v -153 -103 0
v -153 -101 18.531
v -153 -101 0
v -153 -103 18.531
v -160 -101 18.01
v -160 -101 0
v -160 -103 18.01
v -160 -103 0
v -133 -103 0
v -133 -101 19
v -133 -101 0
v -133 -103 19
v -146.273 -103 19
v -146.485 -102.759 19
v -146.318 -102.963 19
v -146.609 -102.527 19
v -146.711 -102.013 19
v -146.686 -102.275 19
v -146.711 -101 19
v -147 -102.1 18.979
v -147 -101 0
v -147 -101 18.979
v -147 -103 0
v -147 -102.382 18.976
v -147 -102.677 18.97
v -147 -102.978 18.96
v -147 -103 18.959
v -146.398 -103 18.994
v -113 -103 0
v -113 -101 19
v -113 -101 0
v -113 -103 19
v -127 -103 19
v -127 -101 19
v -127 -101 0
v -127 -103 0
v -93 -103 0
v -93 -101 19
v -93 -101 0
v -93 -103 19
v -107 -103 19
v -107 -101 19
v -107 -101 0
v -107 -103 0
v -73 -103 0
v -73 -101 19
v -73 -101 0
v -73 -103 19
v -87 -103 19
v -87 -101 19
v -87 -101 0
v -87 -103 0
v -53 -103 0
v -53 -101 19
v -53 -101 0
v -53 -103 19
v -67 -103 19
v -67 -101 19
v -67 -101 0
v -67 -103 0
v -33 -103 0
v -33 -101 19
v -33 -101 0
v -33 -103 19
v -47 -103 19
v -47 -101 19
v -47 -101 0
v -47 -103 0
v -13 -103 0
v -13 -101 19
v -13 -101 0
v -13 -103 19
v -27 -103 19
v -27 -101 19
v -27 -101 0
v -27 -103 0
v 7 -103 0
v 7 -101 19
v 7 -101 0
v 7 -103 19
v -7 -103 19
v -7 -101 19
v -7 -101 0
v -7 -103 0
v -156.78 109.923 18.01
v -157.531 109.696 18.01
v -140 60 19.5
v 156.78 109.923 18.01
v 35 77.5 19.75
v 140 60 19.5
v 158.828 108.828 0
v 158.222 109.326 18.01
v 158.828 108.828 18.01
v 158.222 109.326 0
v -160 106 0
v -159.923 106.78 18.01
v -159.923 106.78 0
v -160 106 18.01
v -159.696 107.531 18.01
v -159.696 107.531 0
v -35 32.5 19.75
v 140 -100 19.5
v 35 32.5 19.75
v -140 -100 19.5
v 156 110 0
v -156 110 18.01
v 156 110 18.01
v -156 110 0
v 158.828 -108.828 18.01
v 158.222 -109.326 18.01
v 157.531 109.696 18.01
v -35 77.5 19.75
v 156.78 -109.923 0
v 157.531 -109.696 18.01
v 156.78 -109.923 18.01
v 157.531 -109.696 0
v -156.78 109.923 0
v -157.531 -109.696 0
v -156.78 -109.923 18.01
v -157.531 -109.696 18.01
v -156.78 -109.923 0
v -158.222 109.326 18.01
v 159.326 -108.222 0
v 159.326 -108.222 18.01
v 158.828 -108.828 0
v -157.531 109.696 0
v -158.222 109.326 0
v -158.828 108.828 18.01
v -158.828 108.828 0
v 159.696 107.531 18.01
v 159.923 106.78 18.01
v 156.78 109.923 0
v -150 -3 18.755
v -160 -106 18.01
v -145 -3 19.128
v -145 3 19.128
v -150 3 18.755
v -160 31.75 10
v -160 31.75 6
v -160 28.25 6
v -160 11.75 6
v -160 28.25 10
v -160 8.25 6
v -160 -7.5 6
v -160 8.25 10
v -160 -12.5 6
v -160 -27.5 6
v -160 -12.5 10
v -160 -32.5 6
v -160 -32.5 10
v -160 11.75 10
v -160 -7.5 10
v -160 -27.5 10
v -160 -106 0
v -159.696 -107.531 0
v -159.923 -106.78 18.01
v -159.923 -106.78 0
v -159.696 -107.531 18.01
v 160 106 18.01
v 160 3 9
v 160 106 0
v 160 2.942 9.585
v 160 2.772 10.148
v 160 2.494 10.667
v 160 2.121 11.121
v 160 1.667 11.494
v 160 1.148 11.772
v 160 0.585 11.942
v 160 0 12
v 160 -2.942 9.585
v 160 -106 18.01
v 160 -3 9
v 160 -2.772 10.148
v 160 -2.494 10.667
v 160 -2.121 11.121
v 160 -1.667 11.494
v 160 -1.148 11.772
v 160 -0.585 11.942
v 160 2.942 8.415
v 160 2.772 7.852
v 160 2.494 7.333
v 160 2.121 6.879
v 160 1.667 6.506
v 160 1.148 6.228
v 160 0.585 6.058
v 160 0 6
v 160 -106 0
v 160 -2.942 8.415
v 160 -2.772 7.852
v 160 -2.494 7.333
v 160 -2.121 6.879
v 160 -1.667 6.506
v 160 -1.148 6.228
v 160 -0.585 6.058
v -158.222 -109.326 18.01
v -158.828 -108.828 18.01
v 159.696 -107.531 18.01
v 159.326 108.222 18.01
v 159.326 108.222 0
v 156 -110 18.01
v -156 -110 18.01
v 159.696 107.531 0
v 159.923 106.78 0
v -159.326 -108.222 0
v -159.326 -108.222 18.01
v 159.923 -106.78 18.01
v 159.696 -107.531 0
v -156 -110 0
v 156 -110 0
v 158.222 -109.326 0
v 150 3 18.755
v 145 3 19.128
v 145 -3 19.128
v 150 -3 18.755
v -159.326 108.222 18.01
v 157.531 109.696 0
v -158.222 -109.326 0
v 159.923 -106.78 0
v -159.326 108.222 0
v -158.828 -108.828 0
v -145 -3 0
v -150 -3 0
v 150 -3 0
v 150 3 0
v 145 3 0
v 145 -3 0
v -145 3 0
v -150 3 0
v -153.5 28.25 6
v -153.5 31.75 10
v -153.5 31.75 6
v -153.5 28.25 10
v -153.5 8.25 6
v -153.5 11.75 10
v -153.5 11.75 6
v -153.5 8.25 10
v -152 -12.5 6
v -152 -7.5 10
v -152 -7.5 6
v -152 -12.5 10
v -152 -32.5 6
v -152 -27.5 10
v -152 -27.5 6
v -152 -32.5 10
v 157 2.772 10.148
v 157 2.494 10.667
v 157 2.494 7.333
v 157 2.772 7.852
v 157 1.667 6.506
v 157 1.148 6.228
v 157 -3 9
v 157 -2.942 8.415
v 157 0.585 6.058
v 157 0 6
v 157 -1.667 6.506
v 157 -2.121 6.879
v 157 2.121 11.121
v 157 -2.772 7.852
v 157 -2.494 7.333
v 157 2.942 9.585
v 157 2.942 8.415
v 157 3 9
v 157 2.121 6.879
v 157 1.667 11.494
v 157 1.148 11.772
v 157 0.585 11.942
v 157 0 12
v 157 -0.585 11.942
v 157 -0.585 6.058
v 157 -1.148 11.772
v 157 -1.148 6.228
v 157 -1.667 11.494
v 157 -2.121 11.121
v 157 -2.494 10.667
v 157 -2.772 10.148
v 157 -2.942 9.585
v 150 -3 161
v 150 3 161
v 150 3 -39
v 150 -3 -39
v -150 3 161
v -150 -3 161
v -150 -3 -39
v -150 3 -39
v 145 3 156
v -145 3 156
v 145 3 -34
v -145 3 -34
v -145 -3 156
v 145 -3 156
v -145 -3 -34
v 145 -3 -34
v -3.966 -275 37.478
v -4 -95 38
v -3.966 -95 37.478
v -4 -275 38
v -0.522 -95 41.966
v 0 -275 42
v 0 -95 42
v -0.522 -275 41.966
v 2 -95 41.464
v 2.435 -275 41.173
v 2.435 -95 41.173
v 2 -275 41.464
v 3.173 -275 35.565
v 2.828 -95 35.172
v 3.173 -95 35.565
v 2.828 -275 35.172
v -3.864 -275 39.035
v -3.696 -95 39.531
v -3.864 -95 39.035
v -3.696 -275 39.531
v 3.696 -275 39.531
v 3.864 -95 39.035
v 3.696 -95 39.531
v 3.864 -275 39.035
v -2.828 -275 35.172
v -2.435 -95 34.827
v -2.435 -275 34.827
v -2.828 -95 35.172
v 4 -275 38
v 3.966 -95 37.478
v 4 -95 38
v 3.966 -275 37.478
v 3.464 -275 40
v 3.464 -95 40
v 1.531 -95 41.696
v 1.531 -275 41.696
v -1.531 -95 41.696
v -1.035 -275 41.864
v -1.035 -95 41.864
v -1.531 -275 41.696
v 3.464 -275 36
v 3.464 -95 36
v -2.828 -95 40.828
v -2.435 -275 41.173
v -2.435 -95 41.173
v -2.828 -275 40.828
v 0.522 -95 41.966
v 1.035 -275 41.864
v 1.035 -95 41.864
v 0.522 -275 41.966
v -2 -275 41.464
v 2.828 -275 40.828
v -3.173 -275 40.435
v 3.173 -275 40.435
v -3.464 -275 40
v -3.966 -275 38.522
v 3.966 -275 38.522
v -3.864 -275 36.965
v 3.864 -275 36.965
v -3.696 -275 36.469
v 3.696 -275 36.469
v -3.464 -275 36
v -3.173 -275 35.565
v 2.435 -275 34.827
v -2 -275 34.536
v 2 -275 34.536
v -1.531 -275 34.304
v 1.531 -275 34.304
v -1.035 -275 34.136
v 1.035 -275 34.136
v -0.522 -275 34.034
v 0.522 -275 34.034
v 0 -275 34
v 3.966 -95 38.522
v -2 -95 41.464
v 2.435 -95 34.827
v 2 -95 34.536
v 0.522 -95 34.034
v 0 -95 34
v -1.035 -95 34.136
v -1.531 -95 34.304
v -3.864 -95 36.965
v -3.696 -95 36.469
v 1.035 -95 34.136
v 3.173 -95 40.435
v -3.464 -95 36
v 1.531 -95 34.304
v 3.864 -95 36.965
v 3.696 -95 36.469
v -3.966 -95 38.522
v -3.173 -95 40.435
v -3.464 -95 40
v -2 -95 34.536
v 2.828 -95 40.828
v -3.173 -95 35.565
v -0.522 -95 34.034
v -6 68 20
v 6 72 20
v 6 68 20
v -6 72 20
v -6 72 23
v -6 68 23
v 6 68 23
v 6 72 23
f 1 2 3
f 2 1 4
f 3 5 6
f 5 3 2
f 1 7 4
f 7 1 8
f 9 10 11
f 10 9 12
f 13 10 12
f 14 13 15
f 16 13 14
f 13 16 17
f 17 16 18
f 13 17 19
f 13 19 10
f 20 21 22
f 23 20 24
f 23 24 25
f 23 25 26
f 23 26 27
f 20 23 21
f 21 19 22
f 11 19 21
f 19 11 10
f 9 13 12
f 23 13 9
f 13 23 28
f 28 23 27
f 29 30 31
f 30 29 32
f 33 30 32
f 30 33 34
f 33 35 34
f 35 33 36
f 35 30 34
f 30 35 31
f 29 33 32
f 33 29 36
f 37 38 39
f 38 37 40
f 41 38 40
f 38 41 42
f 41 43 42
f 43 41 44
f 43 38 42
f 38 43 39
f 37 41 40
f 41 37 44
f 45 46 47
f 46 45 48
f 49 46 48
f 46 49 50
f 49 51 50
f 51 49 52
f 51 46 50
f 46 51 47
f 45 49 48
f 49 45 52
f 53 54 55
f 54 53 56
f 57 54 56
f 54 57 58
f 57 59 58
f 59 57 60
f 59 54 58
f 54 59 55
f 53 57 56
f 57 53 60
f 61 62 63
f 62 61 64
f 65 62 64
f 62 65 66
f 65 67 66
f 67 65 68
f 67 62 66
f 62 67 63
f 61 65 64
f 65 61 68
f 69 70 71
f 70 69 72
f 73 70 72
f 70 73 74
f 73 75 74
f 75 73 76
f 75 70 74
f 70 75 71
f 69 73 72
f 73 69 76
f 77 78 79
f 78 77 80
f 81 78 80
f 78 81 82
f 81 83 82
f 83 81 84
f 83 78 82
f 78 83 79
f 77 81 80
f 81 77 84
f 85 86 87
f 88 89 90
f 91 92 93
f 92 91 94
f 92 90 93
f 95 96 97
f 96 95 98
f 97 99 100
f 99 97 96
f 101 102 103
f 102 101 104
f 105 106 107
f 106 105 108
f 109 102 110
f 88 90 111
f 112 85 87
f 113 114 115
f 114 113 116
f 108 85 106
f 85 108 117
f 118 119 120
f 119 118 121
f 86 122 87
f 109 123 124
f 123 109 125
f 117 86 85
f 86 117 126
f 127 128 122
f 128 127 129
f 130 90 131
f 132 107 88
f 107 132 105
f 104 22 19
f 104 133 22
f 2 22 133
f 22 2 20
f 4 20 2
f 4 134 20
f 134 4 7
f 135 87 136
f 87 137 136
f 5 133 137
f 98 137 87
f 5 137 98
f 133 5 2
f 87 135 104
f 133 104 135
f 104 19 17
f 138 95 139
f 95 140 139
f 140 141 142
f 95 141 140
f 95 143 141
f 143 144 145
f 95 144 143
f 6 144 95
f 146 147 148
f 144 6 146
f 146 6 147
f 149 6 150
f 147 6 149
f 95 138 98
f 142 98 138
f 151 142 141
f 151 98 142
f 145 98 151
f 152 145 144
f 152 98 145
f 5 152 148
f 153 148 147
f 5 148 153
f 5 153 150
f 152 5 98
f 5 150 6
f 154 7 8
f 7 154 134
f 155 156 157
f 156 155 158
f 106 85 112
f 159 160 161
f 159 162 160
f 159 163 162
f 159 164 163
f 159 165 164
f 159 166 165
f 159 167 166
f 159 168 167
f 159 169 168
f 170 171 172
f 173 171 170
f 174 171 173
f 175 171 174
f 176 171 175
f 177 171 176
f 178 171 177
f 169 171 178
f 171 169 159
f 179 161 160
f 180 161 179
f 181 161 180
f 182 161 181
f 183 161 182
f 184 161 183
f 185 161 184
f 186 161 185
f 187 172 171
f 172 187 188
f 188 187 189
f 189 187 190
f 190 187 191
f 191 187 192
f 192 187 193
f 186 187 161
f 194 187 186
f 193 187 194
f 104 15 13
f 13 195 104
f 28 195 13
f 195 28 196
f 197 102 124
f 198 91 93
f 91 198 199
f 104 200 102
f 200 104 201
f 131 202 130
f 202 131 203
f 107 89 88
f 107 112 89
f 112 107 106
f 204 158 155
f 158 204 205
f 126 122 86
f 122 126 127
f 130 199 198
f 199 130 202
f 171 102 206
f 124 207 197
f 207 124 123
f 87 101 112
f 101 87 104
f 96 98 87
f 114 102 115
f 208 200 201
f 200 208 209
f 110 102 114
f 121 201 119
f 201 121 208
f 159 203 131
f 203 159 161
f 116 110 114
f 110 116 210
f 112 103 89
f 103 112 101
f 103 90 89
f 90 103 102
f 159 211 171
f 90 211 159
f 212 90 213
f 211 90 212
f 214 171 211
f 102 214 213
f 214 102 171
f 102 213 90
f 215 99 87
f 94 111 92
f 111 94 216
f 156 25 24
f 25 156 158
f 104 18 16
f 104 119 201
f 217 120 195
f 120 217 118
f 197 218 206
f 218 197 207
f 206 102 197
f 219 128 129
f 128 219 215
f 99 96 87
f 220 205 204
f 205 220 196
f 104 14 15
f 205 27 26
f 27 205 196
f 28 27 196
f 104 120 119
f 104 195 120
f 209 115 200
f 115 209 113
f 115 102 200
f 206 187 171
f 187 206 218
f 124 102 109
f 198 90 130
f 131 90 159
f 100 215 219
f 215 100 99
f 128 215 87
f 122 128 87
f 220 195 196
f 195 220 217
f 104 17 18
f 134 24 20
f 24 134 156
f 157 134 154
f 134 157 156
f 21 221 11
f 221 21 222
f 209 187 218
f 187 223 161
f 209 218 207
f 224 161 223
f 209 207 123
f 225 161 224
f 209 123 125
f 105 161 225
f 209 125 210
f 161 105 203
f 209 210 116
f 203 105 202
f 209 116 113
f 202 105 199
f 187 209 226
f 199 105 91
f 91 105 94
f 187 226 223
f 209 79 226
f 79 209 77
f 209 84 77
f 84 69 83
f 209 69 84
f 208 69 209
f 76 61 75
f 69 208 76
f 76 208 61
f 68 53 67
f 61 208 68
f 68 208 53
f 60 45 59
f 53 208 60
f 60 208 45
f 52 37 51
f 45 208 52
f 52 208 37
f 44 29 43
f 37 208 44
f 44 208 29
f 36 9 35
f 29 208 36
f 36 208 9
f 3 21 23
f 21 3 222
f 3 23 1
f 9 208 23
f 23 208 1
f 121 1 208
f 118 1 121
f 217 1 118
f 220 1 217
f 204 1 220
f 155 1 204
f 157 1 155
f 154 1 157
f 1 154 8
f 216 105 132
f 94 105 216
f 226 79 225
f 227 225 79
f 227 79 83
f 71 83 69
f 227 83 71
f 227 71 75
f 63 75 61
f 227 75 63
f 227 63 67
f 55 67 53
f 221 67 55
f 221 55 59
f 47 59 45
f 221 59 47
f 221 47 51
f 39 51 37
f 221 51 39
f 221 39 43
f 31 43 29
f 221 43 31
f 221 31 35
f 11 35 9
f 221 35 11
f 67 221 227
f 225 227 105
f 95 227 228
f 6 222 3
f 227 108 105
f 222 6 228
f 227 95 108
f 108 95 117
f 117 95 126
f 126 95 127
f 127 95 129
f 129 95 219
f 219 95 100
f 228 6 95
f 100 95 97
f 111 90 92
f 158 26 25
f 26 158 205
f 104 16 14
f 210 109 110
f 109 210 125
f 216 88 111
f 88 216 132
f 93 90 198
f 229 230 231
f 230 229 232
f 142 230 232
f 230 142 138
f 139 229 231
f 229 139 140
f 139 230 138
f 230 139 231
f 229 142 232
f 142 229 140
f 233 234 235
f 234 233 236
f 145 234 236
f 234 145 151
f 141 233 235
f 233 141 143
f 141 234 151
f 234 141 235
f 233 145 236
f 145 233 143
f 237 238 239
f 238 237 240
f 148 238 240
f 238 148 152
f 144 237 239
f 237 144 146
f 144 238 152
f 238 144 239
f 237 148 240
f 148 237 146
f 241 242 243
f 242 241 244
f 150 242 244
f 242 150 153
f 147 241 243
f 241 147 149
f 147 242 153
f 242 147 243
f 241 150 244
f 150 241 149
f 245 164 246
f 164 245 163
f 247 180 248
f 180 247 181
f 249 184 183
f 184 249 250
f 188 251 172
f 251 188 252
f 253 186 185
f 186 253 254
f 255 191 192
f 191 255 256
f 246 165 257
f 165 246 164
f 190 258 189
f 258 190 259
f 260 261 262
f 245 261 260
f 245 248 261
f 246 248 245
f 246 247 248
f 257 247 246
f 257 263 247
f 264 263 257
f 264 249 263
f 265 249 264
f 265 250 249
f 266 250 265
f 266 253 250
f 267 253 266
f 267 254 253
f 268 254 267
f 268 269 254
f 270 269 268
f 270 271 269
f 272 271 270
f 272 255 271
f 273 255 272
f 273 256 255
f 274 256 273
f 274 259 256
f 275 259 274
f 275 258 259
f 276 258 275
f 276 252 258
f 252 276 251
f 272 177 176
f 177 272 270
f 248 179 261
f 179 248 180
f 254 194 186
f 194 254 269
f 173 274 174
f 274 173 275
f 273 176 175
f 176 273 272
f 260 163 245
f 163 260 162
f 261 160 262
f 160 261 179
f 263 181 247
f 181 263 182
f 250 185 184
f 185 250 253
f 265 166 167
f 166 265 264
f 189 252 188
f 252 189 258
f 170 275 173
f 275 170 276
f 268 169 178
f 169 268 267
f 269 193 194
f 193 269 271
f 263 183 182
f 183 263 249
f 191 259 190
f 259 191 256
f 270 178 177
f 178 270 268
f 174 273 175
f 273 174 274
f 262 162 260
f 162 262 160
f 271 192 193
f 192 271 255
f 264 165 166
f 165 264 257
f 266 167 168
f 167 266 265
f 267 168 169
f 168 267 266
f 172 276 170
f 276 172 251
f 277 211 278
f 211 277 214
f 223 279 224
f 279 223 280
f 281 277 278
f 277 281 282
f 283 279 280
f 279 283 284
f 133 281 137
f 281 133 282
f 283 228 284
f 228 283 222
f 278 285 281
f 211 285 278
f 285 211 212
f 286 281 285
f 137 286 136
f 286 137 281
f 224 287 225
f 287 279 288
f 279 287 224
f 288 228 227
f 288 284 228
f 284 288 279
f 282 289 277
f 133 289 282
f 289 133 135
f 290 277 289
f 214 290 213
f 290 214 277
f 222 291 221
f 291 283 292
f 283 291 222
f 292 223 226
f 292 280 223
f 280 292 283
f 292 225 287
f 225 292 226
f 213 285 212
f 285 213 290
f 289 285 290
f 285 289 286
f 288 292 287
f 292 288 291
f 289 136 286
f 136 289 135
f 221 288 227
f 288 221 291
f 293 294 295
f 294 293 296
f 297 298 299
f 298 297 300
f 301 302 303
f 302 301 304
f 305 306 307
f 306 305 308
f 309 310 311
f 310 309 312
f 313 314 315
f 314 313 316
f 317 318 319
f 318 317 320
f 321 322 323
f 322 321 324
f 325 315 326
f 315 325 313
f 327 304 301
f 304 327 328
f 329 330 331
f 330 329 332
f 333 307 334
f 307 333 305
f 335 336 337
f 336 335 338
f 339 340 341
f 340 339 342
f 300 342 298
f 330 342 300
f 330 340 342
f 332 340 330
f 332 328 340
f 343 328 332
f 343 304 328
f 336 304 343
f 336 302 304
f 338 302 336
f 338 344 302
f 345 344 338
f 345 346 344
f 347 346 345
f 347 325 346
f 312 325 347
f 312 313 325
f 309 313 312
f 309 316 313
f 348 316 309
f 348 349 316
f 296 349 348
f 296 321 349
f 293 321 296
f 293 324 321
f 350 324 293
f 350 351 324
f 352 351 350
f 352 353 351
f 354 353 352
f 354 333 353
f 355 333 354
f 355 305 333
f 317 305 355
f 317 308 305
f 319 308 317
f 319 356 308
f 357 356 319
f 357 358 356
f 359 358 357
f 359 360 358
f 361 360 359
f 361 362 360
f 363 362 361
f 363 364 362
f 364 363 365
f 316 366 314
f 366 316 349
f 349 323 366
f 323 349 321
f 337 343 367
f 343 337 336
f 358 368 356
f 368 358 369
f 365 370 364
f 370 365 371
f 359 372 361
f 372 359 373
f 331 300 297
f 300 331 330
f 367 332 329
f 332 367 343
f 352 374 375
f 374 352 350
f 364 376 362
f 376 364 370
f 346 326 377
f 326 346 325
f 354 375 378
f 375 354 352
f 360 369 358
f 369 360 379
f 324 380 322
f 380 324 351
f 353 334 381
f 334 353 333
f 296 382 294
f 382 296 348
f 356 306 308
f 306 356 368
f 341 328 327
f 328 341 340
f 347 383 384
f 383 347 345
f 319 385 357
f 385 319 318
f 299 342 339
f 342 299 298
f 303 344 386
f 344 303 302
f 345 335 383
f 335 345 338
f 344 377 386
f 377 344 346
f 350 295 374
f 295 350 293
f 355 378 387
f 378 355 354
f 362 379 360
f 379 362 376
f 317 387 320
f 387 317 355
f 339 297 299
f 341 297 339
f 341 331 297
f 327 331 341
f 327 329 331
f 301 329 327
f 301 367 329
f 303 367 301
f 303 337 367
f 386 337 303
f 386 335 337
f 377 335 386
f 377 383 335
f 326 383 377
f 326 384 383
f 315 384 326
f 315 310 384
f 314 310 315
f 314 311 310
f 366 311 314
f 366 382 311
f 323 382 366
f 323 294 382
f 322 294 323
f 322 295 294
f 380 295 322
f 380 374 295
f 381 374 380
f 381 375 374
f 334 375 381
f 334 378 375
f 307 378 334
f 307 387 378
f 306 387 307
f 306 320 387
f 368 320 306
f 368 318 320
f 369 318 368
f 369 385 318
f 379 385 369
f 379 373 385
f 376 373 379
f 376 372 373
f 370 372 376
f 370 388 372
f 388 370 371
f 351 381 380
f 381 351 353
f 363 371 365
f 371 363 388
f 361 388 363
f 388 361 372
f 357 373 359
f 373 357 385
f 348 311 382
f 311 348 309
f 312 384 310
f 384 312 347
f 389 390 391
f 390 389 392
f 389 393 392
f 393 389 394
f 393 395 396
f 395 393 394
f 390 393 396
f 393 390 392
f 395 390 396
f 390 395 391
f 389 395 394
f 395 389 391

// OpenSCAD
// file: ../common/branding.scad
module gunnch_badge() {
  linear_extrude(badge_h) translate([0,0,0]) square([badge_w, badge_w/3], center=true);
}
// file: ../common/ports.scad
module usb_c_cutout() {
  translate([0,0,-1]) cube([9, 3.5, wall+2], center=true);
}
module usb_a_cutout() {
  translate([0,0,-1]) cube([12, 5, wall+2], center=true);
}
module audio_3_5_cutout() {
  translate([0,0,-1]) cylinder(h=wall+2, d=6, $fn=32);
}
// file: ../common/dimensions.scad
// Shared dimensions — EVT-0 concept only
wall = 2;
corner_r = 4;
badge_w = 12;
badge_h = 3;
// main file
include <../common/dimensions.scad>
include <../common/ports.scad>
include <../common/branding.scad>

base_l=320; base_w=220; base_h=18;
screen_l=300; screen_w=200; screen_t=6;

module student_base() {
  difference() {
    hull() {
      translate([0,0,base_h/2]) minkowski() {
        cube([base_l-2*corner_r, base_w-2*corner_r, base_h], center=true);
        cylinder(r=corner_r, h=0.01, $fn=32);
      }
      // keyboard deck
      translate([0,-20,base_h]) cube([base_l-40, base_w-60, 3], center=true);
      // trackpad
      translate([0,55,base_h+1]) cube([70,45,1.5], center=true);
    }
    // vent slots
    for (i=[-4:4]) translate([-80+i*20, -base_w/2+8, base_h/2]) cube([14, 2, base_h+2], center=true);
    // ports left
    translate([-base_l/2+2, 30, base_h/2]) usb_c_cutout();
    translate([-base_l/2+2, 10, base_h/2]) usb_c_cutout();
    translate([-base_l/2+2, -10, base_h/2]) usb_a_cutout();
    translate([-base_l/2+2, -30, base_h/2]) usb_a_cutout();
    translate([base_l/2-2, 0, base_h/2]) rotate([0,90,0]) audio_3_5_cutout();
  }
}

module student_screen() {
  difference() {
    translate([0,-base_w/2+screen_w/2+10, base_h+screen_t/2+40]) cube([screen_l, screen_t, screen_w], center=true);
    translate([0,-base_w/2+screen_w/2+10, base_h+screen_t/2+40]) cube([screen_l-10, screen_t+2, screen_w-10], center=true);
  }
  // hinge
  translate([0,-base_w/2+15, base_h+20]) rotate([90,0,0]) cylinder(h=screen_w-20, r=4, $fn=48);
}

union() {
  student_base();
  student_screen();
  translate([0,70,base_h+2]) gunnch_badge();
}
